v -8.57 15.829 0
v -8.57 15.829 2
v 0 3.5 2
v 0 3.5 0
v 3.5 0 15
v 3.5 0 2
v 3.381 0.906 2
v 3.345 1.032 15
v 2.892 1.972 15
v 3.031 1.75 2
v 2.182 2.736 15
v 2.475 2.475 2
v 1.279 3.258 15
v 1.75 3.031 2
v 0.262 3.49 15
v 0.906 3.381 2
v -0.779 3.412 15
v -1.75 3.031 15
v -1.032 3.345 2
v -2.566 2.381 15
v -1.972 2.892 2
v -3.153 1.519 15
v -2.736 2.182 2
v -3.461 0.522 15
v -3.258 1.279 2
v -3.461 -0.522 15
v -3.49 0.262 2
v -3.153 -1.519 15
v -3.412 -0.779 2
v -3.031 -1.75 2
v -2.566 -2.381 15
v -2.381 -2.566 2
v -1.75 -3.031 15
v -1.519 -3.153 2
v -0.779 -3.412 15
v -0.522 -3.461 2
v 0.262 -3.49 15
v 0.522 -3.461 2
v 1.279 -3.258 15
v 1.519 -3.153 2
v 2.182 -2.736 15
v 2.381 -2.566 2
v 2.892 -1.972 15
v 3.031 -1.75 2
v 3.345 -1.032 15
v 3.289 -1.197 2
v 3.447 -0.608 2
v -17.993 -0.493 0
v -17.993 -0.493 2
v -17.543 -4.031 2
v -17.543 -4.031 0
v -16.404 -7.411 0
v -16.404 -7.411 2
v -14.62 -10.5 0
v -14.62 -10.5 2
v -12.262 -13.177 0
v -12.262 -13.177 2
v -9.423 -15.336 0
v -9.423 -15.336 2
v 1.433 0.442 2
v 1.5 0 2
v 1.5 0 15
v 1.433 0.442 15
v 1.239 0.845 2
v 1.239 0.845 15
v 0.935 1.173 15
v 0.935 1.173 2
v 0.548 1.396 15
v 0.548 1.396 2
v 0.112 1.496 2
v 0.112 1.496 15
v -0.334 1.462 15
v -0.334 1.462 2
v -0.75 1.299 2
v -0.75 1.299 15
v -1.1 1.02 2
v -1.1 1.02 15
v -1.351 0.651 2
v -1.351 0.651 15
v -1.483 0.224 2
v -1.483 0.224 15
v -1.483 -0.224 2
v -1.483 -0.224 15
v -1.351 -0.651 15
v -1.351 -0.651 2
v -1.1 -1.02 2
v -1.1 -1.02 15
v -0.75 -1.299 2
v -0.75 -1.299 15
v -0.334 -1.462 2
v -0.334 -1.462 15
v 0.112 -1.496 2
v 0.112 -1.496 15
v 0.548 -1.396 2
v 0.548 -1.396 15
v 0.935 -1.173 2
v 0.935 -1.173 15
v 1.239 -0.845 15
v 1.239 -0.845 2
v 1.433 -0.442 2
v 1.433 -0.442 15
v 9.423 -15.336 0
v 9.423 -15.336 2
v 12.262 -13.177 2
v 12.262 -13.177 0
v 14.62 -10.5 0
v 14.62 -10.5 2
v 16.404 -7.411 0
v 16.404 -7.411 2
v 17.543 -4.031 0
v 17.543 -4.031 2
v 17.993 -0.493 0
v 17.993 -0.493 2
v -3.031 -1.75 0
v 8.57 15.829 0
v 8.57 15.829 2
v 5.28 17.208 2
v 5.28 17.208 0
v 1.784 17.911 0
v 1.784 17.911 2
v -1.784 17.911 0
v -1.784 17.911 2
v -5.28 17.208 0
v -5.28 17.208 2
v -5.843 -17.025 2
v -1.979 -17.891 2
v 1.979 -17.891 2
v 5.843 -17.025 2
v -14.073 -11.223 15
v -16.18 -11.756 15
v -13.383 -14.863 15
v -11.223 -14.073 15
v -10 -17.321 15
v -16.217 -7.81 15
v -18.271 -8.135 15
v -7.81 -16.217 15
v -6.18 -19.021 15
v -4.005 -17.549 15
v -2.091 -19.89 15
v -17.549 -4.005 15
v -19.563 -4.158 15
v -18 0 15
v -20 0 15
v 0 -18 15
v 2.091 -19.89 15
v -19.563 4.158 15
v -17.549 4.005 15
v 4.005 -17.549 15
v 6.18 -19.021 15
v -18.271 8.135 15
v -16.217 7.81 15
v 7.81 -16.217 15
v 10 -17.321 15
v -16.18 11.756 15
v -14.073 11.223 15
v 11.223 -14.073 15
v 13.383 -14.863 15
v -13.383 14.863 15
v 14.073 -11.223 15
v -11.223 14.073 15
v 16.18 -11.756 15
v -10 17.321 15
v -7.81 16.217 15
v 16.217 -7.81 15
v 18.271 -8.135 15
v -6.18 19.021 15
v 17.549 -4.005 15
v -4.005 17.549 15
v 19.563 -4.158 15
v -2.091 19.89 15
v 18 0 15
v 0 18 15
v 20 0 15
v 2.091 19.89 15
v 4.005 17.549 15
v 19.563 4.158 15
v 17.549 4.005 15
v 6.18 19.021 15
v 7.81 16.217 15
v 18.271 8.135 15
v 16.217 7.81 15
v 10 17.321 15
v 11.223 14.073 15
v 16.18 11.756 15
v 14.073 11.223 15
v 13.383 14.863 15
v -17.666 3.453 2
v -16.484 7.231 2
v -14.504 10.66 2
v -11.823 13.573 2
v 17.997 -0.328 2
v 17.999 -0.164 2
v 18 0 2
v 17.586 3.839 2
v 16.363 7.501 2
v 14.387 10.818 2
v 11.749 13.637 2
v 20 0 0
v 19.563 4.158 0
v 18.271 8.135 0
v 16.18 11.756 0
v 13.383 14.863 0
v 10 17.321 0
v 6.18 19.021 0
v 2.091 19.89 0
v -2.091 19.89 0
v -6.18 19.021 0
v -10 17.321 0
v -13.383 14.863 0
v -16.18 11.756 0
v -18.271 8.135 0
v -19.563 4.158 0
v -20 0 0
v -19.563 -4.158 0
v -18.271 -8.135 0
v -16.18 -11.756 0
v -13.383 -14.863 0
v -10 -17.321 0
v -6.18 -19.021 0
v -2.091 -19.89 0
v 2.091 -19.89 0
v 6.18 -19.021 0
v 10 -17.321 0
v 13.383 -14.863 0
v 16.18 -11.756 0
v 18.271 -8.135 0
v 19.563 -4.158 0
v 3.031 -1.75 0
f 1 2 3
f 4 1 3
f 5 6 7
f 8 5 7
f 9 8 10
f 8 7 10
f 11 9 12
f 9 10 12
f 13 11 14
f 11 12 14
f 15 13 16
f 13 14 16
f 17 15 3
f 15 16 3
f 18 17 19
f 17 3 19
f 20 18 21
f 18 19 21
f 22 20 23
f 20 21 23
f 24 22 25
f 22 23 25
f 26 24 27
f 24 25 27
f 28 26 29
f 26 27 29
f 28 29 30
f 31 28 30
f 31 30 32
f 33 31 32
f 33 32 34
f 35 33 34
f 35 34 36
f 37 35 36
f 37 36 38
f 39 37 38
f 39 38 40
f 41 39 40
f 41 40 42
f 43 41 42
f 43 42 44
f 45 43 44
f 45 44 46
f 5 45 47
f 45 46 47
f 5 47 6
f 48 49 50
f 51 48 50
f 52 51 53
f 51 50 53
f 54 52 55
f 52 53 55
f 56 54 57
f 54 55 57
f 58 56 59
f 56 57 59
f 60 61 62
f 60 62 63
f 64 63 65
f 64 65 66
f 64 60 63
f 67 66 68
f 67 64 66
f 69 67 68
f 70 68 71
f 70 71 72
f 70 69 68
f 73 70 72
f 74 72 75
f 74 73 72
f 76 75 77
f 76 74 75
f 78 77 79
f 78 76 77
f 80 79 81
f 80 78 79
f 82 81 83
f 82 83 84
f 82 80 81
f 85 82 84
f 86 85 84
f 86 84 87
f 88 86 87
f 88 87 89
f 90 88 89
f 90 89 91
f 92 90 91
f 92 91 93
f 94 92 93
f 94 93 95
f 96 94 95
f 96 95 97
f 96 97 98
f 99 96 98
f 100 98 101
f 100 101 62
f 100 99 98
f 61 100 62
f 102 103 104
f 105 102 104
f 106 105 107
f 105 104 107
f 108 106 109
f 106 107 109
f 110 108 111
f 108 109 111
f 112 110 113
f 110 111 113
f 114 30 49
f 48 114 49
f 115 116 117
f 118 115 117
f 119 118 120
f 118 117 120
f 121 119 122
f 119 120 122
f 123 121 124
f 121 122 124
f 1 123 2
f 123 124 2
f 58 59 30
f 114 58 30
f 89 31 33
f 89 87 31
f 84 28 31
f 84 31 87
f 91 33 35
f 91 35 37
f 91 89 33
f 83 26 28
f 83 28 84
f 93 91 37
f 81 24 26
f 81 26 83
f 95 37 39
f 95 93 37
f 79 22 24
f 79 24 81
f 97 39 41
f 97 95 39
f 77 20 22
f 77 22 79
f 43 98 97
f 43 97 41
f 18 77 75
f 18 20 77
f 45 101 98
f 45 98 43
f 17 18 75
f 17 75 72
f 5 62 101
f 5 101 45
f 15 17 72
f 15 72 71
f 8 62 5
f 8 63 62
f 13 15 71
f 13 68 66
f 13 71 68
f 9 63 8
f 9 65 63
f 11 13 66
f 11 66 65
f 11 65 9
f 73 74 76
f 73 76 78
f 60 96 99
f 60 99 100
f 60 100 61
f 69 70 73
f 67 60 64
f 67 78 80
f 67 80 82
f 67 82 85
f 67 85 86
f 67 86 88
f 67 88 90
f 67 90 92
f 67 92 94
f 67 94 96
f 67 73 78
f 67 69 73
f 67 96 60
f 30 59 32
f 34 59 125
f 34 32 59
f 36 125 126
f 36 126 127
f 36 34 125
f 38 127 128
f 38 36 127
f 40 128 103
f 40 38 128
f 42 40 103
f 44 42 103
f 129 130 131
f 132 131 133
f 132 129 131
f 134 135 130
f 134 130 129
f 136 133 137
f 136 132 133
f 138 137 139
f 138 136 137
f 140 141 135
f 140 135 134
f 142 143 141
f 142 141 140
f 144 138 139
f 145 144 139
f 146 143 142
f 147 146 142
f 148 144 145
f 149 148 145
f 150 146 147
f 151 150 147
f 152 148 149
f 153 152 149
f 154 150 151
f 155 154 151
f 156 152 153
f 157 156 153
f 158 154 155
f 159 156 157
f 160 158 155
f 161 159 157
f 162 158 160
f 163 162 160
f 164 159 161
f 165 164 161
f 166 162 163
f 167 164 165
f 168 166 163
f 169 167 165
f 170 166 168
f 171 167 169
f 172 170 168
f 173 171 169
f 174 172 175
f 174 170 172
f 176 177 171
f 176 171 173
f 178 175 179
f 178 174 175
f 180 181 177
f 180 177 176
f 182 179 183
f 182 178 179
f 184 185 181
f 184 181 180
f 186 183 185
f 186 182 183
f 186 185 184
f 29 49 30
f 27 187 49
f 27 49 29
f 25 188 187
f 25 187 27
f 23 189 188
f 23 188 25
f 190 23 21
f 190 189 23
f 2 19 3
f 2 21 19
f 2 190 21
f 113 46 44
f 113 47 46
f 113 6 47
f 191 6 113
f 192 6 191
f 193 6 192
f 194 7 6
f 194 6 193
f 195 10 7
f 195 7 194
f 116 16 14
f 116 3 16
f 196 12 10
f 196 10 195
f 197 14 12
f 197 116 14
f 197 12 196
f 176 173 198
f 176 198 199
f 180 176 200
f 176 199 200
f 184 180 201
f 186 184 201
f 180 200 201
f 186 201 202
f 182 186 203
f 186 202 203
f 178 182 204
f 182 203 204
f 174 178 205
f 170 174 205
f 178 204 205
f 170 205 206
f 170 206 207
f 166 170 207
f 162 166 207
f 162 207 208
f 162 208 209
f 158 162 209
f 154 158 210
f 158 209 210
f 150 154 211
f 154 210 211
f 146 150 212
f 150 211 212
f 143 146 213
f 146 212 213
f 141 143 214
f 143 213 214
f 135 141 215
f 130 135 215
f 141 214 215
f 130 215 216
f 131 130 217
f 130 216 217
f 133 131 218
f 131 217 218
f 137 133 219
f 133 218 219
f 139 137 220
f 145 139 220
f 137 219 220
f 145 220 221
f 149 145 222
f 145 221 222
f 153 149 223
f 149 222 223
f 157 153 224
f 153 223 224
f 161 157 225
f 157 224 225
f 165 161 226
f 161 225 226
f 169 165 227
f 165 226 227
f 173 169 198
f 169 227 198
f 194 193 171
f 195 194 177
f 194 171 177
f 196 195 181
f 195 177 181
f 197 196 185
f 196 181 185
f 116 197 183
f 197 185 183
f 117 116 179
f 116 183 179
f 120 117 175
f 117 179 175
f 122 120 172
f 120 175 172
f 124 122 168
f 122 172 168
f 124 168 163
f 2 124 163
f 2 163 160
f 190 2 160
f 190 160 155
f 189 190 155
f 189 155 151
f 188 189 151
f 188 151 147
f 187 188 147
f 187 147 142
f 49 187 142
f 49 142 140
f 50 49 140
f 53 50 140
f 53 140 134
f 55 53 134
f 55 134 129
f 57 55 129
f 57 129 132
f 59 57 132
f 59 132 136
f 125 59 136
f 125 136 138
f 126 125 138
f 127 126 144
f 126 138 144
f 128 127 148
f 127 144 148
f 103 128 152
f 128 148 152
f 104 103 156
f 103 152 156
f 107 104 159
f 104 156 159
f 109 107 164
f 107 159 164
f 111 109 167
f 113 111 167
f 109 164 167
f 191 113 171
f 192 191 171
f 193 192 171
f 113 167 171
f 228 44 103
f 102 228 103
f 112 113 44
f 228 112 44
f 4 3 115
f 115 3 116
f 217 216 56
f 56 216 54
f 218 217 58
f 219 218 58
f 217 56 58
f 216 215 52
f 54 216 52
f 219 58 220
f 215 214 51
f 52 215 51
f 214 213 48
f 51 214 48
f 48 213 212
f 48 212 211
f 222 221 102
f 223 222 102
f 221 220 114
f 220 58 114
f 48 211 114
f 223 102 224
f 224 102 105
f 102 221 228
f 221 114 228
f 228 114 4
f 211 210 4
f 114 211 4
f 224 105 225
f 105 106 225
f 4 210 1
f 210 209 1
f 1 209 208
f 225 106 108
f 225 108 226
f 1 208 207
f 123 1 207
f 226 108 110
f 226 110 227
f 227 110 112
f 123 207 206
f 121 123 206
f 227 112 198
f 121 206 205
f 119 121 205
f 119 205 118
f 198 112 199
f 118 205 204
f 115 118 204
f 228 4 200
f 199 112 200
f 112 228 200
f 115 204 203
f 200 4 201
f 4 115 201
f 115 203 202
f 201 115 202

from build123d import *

# Parameters (mm, degrees)
F0_R     = 20
F1_DEPTH = 15
F2_R     = 18
F3_DEPTH = 13
F4_R     = 3.5
F4_R_2   = 1.5
F5_DEPTH = 13
F7_DEPTH = 100


with BuildPart() as f1:
    # F0 (on Top) → F1 (new body)
    with BuildSketch(Plane.XY):
        Circle(F0_R)
    extrude(amount=F1_DEPTH)

    # F2 (on face) → F3 (cut)
    with BuildSketch(Plane.XY.offset(15)):
        Circle(F2_R)
    extrude(amount=-F3_DEPTH, mode=Mode.SUBTRACT)

    # F4 (on face) → F5 (join)
    with BuildSketch(Plane.XY.offset(2)):
        Circle(F4_R)
        Circle(F4_R_2, mode=Mode.SUBTRACT)
    extrude(amount=F5_DEPTH)

    # F6 (on face) → F7 (cut)
    with BuildSketch(Plane.XY.offset(2)):
        with BuildLine():
            Line((-9.4231661407, -15.3363600598), (-3.0310889132, -1.75))
            Line((-3.0310889132, -1.75), (-17.9932604837, -0.4925212321))
            ThreePointArc((-17.9932604837, -0.4925212321), (-15.5884572681, -9), (-9.4231661407, -15.3363600598))
        make_face()
        with BuildLine():
            Line((-8.570094343, 15.8288812919), (0, 3.5))
            Line((0, 3.5), (8.570094343, 15.8288812919))
            ThreePointArc((8.570094343, 15.8288812919), (0, 18), (-8.570094343, 15.8288812919))
        make_face()
        with BuildLine():
            Line((17.9932604837, -0.4925212321), (3.0310889132, -1.75))
            Line((3.0310889132, -1.75), (9.4231661407, -15.3363600598))
            ThreePointArc((9.4231661407, -15.3363600598), (15.5884572681, -9), (17.9932604837, -0.4925212321))
        make_face()
    extrude(amount=-F7_DEPTH, mode=Mode.SUBTRACT)


solid = f1.part
